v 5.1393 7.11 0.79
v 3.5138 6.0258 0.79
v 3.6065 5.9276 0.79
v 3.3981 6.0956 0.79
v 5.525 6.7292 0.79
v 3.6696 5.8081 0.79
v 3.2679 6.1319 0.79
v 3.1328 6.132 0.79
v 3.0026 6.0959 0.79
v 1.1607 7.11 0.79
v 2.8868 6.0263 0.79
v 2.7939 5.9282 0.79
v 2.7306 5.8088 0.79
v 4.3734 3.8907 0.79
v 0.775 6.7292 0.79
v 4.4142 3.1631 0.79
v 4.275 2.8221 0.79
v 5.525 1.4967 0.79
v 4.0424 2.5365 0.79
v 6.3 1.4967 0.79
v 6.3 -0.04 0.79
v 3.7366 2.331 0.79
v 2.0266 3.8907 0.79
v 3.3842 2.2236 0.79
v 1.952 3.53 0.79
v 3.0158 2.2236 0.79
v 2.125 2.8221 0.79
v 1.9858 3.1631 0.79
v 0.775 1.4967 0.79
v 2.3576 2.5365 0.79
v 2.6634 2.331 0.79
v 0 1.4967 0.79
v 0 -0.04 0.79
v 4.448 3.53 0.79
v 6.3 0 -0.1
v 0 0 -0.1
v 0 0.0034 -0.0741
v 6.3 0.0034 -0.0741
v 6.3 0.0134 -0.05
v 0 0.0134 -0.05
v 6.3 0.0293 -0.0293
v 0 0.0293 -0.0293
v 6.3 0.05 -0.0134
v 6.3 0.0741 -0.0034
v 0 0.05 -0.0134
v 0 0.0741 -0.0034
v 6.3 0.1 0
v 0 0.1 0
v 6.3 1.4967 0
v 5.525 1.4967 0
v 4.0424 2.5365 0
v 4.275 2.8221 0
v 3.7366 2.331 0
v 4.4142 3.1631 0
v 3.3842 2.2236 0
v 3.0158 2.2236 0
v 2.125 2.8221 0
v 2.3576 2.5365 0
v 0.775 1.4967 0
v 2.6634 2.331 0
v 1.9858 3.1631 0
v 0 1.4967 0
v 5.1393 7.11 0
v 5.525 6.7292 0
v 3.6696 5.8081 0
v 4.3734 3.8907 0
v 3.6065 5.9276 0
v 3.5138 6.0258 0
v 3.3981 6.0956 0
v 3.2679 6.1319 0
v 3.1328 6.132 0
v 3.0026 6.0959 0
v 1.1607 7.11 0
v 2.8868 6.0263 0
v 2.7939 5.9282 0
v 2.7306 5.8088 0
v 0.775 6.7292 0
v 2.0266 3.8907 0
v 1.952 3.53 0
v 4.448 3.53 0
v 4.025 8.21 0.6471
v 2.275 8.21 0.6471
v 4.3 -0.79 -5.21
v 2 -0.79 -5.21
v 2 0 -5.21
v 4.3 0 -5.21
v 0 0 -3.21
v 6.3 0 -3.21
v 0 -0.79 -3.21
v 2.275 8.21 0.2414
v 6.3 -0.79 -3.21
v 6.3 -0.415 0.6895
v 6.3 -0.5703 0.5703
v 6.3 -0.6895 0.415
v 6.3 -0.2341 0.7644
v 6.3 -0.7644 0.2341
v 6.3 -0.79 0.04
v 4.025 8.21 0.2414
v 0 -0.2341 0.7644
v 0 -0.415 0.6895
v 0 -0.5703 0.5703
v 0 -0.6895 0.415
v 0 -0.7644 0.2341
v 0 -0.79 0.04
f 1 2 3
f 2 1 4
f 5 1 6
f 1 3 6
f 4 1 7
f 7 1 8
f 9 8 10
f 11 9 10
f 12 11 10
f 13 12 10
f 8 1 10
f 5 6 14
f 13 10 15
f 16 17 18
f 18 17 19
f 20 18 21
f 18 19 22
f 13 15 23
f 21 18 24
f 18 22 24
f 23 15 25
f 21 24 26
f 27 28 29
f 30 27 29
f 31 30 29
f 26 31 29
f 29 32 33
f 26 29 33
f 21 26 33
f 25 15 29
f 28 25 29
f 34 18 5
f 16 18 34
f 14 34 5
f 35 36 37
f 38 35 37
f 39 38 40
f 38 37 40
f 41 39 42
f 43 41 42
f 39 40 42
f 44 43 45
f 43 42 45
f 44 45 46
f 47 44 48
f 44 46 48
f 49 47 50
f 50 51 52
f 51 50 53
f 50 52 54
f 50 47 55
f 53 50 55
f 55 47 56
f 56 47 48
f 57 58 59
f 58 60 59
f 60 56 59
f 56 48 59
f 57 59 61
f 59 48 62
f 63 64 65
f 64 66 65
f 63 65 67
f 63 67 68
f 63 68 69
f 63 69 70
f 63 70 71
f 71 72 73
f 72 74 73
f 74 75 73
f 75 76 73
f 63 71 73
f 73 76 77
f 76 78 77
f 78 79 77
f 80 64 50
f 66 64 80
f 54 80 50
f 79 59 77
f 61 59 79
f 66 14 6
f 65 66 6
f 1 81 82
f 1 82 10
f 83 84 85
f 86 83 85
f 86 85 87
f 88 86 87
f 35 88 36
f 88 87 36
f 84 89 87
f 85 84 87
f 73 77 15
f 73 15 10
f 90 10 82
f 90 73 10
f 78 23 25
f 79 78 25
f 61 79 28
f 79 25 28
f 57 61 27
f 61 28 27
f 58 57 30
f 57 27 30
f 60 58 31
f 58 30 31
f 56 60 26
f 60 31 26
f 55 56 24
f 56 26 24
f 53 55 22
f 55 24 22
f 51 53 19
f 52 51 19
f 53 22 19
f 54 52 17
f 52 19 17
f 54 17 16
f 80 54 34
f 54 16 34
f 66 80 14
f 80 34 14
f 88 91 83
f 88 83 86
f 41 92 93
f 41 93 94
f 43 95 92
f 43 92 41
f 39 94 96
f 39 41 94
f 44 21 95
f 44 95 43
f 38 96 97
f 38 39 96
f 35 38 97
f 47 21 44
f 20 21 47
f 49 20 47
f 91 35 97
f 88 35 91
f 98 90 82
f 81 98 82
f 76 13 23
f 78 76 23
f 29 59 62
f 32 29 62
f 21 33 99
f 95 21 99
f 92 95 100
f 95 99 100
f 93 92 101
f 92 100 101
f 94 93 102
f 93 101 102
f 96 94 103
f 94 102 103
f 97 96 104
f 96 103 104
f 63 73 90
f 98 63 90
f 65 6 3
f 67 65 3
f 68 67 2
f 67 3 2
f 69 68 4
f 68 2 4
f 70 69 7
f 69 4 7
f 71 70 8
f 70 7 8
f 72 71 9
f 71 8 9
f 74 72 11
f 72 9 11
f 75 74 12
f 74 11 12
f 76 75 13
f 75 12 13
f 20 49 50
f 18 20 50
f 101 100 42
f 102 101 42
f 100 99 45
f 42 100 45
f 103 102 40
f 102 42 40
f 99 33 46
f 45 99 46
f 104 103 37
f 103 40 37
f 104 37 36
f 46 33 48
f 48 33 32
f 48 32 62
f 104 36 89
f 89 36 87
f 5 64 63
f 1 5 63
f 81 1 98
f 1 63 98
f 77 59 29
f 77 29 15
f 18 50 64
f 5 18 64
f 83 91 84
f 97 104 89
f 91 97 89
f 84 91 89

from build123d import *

# Parameters (mm, degrees)
BOSS_EXTRUDE1_DEPTH     = 6.3
CHAMFER3_SIZE           = 2
CUT_EXTRUDE2_DEPTH      = 0.79
SKETCH6_W               = 0.775
SKETCH6_H               = 6.713276343
CUT_EXTRUDE4_DEPTH      = 0.79
CUT_EXTRUDE6_DEPTH      = 1.79
CUT_EXTRUDE6_DEPTH_BACK = 6.21


with BuildPart() as part:
    # Sketch1 → Boss-Extrude1 (new body)
    with BuildSketch(Plane(origin=(0, 0, 0), x_dir=(0, 0, -1), z_dir=(1, 0, 0))):
        with BuildLine():
            Line((0, 0.1), (0, 7.11))
            Line((0, 7.11), (-0.241393443, 8.21))
            Line((-0.241393443, 8.21), (-0.647131148, 8.21))
            Line((-0.647131148, 8.21), (-0.79, 7.11))
            Line((-0.79, 7.11), (-0.79, -0.04))
            ThreePointArc((-0.79, -0.04), (-0.570330086, -0.570330086), (-0.04, -0.79))
            Line((-0.04, -0.79), (5.21, -0.79))
            Line((5.21, -0.79), (5.21, 0))
            Line((5.21, 0), (0.1, 0))
            ThreePointArc((0.1, 0), (0.029289322, 0.029289322), (0, 0.1))
        make_face()
    extrude(amount=BOSS_EXTRUDE1_DEPTH)

    # Chamfer3
    chamfer3_edges = [part.edges().sort_by_distance(p)[0] for p in [
        (0, -0.395, -5.21),
        (6.3, -0.395, -5.21),
    ]]
    chamfer(chamfer3_edges, length=CHAMFER3_SIZE)

    # Sketch5 → Cut-Extrude2 (cut)
    with BuildSketch(Plane.XY.offset(0.79)):
        with BuildLine():
            Line((2.730622244, 5.808829869), (2.026555611, 3.890729922))
            ThreePointArc((2.026555611, 3.890729922), (3.20000017, 2.21), (4.373444272, 3.890730241))
            Line((4.373444272, 3.890730241), (3.669633952, 5.808130298))
            ThreePointArc((3.669633952, 5.808130298), (3.200372504, 6.136537762), (2.730622244, 5.808829869))
        make_face()
    extrude(amount=-CUT_EXTRUDE2_DEPTH, mode=Mode.SUBTRACT)

    # Sketch6 → Cut-Extrude4 (cut)
    with BuildSketch(Plane(origin=(0, 0, 0), x_dir=(-1, 0, 0), z_dir=(0, 0, -1))):
        with Locations((-5.9125, 4.853361829)):
            Rectangle(SKETCH6_W, SKETCH6_H)
        with Locations((-0.3875, 4.853361829)):
            Rectangle(SKETCH6_W, SKETCH6_H)
    extrude(amount=-CUT_EXTRUDE4_DEPTH, mode=Mode.SUBTRACT)

    # Sketch4 → Cut-Extrude6 (cut, two sides)
    with BuildSketch(Plane.XY) as cut_extrude6_sk:
        Polygon((2.275, 8.21), (0.775, 8.21), (0.755504439, 6.71), align=None)
        Polygon((5.544495561, 6.71), (4.025, 8.21), (5.525, 8.21), align=None)
    extrude(amount=CUT_EXTRUDE6_DEPTH, mode=Mode.SUBTRACT)
    extrude(cut_extrude6_sk.sketch, amount=-CUT_EXTRUDE6_DEPTH_BACK, mode=Mode.SUBTRACT)


solid = part.part
